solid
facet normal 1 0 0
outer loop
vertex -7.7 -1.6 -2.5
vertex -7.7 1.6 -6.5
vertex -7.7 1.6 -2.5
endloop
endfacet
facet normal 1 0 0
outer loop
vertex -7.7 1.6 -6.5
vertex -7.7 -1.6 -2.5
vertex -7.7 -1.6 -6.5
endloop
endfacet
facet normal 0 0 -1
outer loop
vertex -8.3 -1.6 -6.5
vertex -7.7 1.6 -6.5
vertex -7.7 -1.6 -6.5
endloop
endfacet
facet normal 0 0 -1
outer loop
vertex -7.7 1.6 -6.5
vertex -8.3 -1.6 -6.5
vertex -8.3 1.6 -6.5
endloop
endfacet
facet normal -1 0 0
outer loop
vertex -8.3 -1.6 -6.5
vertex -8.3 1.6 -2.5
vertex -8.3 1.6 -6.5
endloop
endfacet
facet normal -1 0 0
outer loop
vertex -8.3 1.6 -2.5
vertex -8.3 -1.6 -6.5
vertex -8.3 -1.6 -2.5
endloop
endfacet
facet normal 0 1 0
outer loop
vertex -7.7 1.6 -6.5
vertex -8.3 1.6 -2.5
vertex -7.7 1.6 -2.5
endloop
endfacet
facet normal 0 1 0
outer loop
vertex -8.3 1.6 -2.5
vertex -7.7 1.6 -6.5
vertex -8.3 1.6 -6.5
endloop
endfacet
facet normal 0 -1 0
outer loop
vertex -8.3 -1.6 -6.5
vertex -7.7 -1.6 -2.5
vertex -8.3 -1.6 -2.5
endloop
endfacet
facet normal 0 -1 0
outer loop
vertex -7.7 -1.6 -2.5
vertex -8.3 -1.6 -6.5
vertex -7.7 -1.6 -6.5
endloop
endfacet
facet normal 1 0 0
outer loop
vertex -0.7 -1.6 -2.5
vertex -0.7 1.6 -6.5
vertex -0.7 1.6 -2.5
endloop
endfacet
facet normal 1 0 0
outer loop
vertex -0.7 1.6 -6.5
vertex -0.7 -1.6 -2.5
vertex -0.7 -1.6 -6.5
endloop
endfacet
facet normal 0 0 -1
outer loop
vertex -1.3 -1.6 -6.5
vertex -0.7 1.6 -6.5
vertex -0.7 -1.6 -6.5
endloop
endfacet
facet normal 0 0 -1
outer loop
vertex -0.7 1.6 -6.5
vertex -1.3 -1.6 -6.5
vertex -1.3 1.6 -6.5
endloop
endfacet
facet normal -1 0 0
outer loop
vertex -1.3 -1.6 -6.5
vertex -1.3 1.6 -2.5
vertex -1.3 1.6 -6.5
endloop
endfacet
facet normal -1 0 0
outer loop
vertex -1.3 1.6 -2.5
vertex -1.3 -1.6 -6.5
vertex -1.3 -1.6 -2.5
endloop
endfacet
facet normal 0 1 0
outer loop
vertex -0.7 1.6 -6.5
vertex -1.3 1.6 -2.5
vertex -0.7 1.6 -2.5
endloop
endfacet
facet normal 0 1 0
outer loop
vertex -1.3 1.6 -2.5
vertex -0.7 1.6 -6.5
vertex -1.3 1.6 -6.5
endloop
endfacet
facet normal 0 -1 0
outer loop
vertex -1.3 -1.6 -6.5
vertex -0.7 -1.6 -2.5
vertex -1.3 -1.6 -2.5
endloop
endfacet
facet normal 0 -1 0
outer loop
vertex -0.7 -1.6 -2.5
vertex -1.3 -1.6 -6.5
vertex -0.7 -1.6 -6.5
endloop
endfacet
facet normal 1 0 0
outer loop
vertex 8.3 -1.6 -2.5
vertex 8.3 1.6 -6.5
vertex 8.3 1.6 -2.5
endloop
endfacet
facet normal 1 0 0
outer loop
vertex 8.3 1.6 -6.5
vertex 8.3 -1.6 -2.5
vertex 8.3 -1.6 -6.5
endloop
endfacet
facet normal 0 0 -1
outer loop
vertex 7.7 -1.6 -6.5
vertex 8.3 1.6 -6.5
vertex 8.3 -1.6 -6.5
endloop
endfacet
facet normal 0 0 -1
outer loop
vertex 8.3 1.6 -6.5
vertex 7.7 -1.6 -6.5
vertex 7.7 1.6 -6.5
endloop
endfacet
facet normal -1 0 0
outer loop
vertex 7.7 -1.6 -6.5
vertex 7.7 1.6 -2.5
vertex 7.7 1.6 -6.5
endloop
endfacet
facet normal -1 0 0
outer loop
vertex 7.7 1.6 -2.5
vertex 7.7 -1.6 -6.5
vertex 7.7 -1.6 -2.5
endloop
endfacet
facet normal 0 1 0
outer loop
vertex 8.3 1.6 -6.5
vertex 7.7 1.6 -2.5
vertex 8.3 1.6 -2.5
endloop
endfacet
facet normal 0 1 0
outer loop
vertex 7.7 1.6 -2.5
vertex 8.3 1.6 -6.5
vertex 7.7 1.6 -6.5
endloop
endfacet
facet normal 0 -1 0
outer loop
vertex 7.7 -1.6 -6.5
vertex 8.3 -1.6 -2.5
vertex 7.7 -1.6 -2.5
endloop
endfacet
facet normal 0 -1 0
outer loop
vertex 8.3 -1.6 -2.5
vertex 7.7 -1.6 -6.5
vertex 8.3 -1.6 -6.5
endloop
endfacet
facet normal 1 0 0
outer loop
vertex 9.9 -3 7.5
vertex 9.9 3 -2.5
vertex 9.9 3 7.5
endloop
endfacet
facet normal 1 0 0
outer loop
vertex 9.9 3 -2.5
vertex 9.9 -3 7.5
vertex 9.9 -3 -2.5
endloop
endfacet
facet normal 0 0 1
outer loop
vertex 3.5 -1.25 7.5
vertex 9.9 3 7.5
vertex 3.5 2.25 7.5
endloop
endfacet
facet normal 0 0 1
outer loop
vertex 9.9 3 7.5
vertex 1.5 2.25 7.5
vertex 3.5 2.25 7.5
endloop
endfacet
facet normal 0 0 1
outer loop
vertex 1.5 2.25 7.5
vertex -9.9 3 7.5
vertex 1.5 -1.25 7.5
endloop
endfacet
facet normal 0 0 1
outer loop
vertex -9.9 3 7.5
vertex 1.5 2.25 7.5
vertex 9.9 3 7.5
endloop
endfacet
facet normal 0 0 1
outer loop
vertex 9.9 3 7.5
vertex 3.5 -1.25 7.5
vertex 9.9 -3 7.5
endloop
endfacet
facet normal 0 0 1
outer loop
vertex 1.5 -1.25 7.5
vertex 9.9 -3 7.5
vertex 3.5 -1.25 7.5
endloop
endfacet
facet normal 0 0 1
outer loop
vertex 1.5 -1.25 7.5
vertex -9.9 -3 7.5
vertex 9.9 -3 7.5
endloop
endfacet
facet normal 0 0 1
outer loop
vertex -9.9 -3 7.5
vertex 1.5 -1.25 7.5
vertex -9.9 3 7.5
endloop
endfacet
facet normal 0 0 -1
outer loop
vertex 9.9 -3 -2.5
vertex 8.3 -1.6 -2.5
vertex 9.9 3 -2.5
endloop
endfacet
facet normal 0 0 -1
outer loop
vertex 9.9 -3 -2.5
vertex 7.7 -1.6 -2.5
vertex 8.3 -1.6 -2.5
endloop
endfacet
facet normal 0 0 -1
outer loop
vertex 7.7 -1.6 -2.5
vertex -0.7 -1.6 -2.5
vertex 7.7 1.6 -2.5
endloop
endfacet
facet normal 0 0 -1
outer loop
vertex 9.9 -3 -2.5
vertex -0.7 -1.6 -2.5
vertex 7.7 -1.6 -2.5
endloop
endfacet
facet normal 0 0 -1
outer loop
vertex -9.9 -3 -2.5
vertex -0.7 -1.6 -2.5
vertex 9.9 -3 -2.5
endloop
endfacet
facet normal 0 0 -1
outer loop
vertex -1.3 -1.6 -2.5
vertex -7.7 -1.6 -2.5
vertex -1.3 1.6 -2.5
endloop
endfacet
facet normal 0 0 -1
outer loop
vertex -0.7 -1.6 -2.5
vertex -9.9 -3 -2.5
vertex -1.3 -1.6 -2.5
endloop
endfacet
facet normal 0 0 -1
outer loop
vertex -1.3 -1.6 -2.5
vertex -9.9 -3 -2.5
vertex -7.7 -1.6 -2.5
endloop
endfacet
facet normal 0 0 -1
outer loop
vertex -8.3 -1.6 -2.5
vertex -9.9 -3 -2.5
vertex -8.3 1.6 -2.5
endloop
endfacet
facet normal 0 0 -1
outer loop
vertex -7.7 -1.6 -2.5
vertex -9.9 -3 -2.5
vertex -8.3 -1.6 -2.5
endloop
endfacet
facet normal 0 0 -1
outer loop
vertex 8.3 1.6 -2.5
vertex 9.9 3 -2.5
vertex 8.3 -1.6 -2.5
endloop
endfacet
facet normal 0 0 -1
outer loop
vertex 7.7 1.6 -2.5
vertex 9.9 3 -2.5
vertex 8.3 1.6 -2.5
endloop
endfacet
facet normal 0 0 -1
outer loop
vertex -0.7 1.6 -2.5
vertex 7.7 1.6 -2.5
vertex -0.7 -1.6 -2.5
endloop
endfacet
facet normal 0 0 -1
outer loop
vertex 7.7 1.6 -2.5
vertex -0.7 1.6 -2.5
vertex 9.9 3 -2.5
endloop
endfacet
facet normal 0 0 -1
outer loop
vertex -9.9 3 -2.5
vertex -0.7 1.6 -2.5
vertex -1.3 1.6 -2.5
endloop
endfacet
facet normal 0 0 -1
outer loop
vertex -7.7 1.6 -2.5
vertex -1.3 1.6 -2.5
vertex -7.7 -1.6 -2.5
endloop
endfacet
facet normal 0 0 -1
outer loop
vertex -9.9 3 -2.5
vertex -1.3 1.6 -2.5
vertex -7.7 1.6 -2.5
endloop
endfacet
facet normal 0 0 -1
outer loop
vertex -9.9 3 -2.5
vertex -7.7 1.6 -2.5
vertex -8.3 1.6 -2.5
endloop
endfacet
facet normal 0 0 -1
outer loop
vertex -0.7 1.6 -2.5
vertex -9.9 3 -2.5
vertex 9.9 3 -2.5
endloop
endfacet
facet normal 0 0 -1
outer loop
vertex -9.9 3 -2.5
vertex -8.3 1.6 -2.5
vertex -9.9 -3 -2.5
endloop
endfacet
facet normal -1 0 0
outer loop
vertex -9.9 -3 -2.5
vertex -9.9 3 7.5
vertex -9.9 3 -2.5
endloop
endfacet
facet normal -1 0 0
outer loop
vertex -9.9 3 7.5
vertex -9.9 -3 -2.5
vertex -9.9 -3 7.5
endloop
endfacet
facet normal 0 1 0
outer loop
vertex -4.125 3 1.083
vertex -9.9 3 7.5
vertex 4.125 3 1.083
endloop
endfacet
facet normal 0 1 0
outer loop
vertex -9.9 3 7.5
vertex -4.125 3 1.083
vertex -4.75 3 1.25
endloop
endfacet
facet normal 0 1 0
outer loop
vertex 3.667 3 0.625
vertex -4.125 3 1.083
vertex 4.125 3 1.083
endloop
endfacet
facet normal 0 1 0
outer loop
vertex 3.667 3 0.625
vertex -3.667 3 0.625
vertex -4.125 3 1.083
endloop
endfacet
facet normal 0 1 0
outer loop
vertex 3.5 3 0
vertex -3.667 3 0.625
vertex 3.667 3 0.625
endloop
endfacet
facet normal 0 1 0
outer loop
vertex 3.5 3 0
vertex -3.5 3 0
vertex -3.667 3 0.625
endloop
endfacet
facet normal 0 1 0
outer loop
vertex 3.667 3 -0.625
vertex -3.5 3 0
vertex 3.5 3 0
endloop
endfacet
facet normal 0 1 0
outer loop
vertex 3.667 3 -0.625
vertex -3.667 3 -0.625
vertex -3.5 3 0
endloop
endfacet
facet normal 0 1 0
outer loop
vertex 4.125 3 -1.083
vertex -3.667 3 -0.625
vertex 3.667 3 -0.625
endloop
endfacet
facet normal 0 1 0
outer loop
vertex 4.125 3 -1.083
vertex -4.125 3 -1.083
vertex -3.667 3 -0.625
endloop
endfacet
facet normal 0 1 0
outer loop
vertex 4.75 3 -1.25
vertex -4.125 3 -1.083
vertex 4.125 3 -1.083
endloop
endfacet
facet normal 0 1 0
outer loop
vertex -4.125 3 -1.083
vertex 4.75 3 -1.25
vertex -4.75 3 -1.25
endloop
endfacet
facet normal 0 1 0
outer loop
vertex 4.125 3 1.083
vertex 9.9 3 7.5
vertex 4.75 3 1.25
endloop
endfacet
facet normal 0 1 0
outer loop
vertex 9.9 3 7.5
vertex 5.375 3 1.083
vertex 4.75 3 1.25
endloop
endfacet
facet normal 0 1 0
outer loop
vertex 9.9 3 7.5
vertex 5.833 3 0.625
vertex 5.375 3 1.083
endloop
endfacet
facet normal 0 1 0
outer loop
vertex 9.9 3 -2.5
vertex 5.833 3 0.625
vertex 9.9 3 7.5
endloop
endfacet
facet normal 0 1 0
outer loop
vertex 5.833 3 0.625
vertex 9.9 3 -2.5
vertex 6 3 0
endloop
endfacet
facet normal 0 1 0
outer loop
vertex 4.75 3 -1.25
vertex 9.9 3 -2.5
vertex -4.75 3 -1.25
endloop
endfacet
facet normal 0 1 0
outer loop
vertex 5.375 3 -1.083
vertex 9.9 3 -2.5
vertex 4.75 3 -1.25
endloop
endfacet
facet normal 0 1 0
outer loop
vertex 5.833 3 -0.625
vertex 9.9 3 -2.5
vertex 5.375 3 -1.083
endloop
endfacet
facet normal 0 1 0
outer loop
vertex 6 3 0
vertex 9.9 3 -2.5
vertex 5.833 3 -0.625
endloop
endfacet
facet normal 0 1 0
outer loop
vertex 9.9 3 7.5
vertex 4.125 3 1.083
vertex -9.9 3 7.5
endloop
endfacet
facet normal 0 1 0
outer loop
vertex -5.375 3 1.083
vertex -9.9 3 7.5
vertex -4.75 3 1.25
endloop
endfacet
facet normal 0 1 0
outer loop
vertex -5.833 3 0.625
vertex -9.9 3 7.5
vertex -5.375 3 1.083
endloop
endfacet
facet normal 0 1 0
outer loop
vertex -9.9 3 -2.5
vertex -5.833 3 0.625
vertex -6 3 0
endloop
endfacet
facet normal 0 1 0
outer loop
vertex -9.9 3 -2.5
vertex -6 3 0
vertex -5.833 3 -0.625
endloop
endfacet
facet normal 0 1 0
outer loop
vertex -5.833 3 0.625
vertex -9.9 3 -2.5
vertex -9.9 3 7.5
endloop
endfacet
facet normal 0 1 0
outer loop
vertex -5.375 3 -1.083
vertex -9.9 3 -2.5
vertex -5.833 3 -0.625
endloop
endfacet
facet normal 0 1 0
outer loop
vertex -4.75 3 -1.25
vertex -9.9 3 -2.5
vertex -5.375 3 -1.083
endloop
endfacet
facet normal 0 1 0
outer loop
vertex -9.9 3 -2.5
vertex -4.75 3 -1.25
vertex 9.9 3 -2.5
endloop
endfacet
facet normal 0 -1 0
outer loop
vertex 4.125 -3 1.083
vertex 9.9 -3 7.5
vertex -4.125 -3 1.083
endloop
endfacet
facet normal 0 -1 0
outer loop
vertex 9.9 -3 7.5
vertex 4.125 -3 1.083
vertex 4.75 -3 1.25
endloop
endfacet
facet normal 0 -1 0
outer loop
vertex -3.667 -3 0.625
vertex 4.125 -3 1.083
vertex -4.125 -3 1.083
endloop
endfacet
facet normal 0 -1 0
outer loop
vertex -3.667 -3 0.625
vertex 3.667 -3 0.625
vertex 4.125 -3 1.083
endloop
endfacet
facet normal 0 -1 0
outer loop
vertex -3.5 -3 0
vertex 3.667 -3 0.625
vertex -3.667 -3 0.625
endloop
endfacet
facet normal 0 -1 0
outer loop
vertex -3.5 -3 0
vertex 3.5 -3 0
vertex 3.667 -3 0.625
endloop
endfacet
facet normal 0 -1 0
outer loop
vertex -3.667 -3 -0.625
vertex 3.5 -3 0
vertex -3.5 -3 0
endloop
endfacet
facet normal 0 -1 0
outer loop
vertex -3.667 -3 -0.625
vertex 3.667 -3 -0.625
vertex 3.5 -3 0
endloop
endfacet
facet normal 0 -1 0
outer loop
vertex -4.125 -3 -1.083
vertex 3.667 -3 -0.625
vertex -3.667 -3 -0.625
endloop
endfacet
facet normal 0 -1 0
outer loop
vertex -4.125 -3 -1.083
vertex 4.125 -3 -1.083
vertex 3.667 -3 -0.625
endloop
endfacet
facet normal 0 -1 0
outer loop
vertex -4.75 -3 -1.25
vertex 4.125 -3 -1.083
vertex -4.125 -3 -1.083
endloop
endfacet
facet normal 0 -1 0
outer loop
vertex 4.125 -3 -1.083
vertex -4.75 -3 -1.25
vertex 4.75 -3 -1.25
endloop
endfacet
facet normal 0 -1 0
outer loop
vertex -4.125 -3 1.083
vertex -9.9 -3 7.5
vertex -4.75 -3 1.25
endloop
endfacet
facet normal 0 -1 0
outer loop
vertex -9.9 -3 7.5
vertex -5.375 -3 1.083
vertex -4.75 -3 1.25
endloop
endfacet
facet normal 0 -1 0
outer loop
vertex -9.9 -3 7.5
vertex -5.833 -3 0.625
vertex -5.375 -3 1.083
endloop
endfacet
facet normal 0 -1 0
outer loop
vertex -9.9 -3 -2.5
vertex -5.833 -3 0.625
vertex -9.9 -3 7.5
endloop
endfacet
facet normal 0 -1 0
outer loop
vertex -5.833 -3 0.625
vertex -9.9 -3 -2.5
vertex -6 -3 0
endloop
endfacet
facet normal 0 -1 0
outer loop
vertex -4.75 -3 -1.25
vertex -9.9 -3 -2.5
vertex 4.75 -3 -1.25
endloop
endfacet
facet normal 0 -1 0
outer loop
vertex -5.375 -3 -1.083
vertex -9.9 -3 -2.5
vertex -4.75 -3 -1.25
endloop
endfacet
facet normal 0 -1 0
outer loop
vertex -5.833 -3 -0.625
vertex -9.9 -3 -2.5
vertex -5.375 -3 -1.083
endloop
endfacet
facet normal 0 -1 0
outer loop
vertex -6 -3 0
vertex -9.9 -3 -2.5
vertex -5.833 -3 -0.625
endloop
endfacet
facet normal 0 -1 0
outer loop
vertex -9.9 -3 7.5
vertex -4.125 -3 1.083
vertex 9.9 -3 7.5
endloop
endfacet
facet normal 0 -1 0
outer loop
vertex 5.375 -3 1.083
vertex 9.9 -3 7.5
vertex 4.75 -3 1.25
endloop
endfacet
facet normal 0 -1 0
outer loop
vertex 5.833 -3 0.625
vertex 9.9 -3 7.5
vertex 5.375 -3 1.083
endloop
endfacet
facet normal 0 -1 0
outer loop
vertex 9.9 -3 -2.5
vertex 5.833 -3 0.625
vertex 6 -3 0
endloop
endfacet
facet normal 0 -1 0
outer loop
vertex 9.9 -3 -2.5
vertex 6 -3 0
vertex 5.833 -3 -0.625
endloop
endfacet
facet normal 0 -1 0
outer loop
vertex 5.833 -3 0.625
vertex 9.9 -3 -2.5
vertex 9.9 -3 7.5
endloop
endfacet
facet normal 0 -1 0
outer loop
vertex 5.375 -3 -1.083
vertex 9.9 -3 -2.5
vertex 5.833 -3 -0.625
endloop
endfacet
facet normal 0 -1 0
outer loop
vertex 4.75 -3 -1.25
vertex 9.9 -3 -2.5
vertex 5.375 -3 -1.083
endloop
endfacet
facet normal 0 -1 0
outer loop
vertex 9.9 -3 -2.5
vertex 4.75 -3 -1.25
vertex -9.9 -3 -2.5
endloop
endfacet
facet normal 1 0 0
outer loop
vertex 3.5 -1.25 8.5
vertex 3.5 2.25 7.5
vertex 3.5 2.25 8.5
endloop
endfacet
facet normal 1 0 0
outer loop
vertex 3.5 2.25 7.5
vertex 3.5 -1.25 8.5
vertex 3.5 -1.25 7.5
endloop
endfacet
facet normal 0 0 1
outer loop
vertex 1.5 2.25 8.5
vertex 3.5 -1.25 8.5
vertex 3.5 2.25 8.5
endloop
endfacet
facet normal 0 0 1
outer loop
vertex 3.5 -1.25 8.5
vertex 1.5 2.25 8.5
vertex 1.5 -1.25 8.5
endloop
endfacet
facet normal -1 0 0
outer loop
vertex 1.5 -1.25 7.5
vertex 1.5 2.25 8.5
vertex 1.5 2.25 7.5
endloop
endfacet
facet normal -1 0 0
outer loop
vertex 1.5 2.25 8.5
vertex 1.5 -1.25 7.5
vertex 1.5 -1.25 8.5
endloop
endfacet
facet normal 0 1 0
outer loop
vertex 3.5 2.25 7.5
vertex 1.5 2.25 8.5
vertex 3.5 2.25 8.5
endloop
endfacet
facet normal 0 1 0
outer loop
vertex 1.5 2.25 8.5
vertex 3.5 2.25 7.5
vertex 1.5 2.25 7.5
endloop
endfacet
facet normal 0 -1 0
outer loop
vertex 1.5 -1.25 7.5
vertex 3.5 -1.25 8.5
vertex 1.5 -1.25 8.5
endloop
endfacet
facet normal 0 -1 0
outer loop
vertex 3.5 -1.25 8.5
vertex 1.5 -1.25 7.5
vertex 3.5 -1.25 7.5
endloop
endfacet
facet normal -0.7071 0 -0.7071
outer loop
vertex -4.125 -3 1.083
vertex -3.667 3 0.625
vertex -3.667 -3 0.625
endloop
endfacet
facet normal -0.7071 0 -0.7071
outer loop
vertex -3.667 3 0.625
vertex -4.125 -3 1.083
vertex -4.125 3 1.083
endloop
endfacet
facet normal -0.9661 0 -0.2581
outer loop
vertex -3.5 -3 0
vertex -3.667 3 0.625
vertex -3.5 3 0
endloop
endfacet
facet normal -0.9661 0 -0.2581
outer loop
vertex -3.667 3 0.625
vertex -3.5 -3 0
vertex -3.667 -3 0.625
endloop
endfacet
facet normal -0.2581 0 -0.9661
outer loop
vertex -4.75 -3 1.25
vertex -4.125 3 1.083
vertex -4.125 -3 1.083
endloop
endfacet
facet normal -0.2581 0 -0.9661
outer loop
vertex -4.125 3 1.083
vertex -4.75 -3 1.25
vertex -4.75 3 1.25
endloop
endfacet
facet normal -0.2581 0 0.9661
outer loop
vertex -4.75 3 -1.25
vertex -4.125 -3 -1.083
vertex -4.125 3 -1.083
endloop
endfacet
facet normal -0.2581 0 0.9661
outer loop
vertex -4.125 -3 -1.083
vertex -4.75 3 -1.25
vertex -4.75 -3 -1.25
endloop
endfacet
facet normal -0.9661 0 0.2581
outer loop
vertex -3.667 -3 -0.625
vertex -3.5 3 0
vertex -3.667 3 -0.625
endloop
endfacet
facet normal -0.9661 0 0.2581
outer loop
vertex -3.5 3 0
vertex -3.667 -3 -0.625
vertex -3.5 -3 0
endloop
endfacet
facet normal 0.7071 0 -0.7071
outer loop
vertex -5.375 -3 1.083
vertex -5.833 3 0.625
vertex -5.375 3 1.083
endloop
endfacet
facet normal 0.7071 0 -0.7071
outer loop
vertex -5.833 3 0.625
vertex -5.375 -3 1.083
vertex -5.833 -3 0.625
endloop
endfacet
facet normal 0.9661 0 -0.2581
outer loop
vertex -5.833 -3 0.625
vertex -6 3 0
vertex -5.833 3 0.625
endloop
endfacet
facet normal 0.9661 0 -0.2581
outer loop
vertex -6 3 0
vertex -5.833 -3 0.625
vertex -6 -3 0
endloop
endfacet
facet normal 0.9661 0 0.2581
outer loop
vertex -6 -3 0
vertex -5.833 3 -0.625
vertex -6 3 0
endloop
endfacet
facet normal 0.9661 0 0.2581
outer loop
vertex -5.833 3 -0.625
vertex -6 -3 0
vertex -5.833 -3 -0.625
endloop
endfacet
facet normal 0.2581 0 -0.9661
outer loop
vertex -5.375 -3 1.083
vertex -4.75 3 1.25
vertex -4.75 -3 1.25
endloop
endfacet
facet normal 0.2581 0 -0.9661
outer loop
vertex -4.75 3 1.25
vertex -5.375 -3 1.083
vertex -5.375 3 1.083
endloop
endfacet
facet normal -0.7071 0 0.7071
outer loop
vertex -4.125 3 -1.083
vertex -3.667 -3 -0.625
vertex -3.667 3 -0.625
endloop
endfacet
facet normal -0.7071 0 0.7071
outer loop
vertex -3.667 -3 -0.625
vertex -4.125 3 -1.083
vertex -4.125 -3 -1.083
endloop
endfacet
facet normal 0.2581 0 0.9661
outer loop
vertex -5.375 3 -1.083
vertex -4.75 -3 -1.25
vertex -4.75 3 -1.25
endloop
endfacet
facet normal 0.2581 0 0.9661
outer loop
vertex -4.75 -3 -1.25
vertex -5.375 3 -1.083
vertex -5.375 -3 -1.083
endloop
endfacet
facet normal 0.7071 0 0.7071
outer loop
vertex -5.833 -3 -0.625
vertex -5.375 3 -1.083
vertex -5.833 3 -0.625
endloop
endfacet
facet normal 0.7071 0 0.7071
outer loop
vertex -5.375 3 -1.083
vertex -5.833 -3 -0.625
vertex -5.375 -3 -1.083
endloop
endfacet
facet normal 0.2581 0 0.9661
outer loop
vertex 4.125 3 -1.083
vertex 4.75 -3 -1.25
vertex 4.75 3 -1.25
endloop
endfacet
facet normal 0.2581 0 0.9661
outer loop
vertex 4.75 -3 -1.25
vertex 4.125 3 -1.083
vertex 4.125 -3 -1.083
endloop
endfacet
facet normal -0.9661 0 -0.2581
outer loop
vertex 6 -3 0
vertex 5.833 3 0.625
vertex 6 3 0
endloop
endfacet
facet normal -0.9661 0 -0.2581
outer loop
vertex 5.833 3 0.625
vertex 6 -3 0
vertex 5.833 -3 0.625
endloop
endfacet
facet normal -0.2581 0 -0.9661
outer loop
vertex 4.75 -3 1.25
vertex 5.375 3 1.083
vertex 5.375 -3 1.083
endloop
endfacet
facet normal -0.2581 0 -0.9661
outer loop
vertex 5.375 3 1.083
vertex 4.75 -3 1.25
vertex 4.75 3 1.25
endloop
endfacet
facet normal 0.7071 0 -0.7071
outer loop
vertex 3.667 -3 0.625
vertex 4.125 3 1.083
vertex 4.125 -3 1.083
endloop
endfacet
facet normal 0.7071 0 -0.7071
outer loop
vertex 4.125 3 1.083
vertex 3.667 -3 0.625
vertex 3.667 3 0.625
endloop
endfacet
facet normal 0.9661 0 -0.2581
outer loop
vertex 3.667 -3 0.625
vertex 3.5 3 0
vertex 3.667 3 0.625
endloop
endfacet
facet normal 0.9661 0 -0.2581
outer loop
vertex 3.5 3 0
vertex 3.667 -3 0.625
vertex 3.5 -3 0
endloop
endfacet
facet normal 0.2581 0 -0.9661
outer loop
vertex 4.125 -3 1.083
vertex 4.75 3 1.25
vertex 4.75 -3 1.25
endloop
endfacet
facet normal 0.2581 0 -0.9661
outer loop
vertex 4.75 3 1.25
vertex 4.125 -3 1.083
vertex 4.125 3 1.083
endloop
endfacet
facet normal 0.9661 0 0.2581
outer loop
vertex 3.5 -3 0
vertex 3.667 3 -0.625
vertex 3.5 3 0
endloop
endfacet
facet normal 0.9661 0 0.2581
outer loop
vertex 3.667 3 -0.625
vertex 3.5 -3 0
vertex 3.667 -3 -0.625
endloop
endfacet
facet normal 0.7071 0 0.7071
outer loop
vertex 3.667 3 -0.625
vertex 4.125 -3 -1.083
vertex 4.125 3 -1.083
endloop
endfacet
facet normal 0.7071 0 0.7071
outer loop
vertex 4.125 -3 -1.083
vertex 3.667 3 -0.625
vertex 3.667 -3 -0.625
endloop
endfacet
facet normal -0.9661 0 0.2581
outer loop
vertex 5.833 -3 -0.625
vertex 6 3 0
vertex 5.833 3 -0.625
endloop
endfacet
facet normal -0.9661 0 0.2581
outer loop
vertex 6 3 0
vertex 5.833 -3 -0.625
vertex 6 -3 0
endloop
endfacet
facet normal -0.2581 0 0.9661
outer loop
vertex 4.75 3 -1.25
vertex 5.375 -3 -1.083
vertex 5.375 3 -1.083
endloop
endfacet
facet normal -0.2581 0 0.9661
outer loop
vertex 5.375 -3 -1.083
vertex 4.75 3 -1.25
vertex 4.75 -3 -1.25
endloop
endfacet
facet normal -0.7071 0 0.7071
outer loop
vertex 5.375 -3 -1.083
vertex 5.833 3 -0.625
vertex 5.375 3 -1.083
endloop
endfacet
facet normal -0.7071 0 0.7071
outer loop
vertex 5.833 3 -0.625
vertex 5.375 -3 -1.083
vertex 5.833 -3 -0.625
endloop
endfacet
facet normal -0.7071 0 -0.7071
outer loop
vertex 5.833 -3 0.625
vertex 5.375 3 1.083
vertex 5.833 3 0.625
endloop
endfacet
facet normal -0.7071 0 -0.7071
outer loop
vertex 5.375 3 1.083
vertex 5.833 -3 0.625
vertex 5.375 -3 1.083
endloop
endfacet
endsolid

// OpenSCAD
/**
 * @author Johann Rocholl <johann@rocholl.net>
 * @license GPL-3.0
 */

// Don't print this file, purchase real micro switches
// e.g. Honeywell ZM10B10A01 or OMRON SS-5 or similar.

module microswitch() {
  difference() {
    union() {
      translate([0, 0, 2.5])
        cube([19.8, 6, 10], center=true);
      translate([2.5, 0.5, 6])
        cube([2, 3.5, 5], center=true);
      for (x = [-8, -1, 8]) {
        translate([x, 0, 0])
          cube([0.6, 3.2, 13], center=true);
      }
    }
    for (x = [-9.5/2, 9.5/2]) {
      translate([x, 0, 0]) rotate([90, 0, 0])
        cylinder(r=2.5/2, h=20, center=true, $fn=12);
    }
  }
}

microswitch();
